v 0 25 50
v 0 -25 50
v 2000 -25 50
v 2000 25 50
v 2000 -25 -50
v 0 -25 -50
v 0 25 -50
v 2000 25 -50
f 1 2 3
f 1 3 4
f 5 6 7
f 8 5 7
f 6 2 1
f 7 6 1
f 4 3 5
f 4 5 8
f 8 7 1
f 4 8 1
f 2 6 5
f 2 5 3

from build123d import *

# Parameters (mm, degrees)
F0_W     = 50
F0_H     = 100
F1_DEPTH = 2000
F3_ANGLE = -90


with BuildPart() as f1:
    # F0 (on Right) → F1 (new body)
    with BuildSketch(Plane.YZ):
        Rectangle(F0_W, F0_H)
    extrude(amount=F1_DEPTH)


with BuildPart() as f2_1:
    # F2: copy of F1
    add(f1.part.moved(Location((0, 2000, 0))))


with BuildPart() as f3_1:
    # F3: copy of F1
    add(f1.part.rotate(Axis((0, -25, 0), (0, 0, 1)), F3_ANGLE))


with BuildPart() as f5_1:
    # F5: copy of F1
    add(f1.part)


solid = f1.part
